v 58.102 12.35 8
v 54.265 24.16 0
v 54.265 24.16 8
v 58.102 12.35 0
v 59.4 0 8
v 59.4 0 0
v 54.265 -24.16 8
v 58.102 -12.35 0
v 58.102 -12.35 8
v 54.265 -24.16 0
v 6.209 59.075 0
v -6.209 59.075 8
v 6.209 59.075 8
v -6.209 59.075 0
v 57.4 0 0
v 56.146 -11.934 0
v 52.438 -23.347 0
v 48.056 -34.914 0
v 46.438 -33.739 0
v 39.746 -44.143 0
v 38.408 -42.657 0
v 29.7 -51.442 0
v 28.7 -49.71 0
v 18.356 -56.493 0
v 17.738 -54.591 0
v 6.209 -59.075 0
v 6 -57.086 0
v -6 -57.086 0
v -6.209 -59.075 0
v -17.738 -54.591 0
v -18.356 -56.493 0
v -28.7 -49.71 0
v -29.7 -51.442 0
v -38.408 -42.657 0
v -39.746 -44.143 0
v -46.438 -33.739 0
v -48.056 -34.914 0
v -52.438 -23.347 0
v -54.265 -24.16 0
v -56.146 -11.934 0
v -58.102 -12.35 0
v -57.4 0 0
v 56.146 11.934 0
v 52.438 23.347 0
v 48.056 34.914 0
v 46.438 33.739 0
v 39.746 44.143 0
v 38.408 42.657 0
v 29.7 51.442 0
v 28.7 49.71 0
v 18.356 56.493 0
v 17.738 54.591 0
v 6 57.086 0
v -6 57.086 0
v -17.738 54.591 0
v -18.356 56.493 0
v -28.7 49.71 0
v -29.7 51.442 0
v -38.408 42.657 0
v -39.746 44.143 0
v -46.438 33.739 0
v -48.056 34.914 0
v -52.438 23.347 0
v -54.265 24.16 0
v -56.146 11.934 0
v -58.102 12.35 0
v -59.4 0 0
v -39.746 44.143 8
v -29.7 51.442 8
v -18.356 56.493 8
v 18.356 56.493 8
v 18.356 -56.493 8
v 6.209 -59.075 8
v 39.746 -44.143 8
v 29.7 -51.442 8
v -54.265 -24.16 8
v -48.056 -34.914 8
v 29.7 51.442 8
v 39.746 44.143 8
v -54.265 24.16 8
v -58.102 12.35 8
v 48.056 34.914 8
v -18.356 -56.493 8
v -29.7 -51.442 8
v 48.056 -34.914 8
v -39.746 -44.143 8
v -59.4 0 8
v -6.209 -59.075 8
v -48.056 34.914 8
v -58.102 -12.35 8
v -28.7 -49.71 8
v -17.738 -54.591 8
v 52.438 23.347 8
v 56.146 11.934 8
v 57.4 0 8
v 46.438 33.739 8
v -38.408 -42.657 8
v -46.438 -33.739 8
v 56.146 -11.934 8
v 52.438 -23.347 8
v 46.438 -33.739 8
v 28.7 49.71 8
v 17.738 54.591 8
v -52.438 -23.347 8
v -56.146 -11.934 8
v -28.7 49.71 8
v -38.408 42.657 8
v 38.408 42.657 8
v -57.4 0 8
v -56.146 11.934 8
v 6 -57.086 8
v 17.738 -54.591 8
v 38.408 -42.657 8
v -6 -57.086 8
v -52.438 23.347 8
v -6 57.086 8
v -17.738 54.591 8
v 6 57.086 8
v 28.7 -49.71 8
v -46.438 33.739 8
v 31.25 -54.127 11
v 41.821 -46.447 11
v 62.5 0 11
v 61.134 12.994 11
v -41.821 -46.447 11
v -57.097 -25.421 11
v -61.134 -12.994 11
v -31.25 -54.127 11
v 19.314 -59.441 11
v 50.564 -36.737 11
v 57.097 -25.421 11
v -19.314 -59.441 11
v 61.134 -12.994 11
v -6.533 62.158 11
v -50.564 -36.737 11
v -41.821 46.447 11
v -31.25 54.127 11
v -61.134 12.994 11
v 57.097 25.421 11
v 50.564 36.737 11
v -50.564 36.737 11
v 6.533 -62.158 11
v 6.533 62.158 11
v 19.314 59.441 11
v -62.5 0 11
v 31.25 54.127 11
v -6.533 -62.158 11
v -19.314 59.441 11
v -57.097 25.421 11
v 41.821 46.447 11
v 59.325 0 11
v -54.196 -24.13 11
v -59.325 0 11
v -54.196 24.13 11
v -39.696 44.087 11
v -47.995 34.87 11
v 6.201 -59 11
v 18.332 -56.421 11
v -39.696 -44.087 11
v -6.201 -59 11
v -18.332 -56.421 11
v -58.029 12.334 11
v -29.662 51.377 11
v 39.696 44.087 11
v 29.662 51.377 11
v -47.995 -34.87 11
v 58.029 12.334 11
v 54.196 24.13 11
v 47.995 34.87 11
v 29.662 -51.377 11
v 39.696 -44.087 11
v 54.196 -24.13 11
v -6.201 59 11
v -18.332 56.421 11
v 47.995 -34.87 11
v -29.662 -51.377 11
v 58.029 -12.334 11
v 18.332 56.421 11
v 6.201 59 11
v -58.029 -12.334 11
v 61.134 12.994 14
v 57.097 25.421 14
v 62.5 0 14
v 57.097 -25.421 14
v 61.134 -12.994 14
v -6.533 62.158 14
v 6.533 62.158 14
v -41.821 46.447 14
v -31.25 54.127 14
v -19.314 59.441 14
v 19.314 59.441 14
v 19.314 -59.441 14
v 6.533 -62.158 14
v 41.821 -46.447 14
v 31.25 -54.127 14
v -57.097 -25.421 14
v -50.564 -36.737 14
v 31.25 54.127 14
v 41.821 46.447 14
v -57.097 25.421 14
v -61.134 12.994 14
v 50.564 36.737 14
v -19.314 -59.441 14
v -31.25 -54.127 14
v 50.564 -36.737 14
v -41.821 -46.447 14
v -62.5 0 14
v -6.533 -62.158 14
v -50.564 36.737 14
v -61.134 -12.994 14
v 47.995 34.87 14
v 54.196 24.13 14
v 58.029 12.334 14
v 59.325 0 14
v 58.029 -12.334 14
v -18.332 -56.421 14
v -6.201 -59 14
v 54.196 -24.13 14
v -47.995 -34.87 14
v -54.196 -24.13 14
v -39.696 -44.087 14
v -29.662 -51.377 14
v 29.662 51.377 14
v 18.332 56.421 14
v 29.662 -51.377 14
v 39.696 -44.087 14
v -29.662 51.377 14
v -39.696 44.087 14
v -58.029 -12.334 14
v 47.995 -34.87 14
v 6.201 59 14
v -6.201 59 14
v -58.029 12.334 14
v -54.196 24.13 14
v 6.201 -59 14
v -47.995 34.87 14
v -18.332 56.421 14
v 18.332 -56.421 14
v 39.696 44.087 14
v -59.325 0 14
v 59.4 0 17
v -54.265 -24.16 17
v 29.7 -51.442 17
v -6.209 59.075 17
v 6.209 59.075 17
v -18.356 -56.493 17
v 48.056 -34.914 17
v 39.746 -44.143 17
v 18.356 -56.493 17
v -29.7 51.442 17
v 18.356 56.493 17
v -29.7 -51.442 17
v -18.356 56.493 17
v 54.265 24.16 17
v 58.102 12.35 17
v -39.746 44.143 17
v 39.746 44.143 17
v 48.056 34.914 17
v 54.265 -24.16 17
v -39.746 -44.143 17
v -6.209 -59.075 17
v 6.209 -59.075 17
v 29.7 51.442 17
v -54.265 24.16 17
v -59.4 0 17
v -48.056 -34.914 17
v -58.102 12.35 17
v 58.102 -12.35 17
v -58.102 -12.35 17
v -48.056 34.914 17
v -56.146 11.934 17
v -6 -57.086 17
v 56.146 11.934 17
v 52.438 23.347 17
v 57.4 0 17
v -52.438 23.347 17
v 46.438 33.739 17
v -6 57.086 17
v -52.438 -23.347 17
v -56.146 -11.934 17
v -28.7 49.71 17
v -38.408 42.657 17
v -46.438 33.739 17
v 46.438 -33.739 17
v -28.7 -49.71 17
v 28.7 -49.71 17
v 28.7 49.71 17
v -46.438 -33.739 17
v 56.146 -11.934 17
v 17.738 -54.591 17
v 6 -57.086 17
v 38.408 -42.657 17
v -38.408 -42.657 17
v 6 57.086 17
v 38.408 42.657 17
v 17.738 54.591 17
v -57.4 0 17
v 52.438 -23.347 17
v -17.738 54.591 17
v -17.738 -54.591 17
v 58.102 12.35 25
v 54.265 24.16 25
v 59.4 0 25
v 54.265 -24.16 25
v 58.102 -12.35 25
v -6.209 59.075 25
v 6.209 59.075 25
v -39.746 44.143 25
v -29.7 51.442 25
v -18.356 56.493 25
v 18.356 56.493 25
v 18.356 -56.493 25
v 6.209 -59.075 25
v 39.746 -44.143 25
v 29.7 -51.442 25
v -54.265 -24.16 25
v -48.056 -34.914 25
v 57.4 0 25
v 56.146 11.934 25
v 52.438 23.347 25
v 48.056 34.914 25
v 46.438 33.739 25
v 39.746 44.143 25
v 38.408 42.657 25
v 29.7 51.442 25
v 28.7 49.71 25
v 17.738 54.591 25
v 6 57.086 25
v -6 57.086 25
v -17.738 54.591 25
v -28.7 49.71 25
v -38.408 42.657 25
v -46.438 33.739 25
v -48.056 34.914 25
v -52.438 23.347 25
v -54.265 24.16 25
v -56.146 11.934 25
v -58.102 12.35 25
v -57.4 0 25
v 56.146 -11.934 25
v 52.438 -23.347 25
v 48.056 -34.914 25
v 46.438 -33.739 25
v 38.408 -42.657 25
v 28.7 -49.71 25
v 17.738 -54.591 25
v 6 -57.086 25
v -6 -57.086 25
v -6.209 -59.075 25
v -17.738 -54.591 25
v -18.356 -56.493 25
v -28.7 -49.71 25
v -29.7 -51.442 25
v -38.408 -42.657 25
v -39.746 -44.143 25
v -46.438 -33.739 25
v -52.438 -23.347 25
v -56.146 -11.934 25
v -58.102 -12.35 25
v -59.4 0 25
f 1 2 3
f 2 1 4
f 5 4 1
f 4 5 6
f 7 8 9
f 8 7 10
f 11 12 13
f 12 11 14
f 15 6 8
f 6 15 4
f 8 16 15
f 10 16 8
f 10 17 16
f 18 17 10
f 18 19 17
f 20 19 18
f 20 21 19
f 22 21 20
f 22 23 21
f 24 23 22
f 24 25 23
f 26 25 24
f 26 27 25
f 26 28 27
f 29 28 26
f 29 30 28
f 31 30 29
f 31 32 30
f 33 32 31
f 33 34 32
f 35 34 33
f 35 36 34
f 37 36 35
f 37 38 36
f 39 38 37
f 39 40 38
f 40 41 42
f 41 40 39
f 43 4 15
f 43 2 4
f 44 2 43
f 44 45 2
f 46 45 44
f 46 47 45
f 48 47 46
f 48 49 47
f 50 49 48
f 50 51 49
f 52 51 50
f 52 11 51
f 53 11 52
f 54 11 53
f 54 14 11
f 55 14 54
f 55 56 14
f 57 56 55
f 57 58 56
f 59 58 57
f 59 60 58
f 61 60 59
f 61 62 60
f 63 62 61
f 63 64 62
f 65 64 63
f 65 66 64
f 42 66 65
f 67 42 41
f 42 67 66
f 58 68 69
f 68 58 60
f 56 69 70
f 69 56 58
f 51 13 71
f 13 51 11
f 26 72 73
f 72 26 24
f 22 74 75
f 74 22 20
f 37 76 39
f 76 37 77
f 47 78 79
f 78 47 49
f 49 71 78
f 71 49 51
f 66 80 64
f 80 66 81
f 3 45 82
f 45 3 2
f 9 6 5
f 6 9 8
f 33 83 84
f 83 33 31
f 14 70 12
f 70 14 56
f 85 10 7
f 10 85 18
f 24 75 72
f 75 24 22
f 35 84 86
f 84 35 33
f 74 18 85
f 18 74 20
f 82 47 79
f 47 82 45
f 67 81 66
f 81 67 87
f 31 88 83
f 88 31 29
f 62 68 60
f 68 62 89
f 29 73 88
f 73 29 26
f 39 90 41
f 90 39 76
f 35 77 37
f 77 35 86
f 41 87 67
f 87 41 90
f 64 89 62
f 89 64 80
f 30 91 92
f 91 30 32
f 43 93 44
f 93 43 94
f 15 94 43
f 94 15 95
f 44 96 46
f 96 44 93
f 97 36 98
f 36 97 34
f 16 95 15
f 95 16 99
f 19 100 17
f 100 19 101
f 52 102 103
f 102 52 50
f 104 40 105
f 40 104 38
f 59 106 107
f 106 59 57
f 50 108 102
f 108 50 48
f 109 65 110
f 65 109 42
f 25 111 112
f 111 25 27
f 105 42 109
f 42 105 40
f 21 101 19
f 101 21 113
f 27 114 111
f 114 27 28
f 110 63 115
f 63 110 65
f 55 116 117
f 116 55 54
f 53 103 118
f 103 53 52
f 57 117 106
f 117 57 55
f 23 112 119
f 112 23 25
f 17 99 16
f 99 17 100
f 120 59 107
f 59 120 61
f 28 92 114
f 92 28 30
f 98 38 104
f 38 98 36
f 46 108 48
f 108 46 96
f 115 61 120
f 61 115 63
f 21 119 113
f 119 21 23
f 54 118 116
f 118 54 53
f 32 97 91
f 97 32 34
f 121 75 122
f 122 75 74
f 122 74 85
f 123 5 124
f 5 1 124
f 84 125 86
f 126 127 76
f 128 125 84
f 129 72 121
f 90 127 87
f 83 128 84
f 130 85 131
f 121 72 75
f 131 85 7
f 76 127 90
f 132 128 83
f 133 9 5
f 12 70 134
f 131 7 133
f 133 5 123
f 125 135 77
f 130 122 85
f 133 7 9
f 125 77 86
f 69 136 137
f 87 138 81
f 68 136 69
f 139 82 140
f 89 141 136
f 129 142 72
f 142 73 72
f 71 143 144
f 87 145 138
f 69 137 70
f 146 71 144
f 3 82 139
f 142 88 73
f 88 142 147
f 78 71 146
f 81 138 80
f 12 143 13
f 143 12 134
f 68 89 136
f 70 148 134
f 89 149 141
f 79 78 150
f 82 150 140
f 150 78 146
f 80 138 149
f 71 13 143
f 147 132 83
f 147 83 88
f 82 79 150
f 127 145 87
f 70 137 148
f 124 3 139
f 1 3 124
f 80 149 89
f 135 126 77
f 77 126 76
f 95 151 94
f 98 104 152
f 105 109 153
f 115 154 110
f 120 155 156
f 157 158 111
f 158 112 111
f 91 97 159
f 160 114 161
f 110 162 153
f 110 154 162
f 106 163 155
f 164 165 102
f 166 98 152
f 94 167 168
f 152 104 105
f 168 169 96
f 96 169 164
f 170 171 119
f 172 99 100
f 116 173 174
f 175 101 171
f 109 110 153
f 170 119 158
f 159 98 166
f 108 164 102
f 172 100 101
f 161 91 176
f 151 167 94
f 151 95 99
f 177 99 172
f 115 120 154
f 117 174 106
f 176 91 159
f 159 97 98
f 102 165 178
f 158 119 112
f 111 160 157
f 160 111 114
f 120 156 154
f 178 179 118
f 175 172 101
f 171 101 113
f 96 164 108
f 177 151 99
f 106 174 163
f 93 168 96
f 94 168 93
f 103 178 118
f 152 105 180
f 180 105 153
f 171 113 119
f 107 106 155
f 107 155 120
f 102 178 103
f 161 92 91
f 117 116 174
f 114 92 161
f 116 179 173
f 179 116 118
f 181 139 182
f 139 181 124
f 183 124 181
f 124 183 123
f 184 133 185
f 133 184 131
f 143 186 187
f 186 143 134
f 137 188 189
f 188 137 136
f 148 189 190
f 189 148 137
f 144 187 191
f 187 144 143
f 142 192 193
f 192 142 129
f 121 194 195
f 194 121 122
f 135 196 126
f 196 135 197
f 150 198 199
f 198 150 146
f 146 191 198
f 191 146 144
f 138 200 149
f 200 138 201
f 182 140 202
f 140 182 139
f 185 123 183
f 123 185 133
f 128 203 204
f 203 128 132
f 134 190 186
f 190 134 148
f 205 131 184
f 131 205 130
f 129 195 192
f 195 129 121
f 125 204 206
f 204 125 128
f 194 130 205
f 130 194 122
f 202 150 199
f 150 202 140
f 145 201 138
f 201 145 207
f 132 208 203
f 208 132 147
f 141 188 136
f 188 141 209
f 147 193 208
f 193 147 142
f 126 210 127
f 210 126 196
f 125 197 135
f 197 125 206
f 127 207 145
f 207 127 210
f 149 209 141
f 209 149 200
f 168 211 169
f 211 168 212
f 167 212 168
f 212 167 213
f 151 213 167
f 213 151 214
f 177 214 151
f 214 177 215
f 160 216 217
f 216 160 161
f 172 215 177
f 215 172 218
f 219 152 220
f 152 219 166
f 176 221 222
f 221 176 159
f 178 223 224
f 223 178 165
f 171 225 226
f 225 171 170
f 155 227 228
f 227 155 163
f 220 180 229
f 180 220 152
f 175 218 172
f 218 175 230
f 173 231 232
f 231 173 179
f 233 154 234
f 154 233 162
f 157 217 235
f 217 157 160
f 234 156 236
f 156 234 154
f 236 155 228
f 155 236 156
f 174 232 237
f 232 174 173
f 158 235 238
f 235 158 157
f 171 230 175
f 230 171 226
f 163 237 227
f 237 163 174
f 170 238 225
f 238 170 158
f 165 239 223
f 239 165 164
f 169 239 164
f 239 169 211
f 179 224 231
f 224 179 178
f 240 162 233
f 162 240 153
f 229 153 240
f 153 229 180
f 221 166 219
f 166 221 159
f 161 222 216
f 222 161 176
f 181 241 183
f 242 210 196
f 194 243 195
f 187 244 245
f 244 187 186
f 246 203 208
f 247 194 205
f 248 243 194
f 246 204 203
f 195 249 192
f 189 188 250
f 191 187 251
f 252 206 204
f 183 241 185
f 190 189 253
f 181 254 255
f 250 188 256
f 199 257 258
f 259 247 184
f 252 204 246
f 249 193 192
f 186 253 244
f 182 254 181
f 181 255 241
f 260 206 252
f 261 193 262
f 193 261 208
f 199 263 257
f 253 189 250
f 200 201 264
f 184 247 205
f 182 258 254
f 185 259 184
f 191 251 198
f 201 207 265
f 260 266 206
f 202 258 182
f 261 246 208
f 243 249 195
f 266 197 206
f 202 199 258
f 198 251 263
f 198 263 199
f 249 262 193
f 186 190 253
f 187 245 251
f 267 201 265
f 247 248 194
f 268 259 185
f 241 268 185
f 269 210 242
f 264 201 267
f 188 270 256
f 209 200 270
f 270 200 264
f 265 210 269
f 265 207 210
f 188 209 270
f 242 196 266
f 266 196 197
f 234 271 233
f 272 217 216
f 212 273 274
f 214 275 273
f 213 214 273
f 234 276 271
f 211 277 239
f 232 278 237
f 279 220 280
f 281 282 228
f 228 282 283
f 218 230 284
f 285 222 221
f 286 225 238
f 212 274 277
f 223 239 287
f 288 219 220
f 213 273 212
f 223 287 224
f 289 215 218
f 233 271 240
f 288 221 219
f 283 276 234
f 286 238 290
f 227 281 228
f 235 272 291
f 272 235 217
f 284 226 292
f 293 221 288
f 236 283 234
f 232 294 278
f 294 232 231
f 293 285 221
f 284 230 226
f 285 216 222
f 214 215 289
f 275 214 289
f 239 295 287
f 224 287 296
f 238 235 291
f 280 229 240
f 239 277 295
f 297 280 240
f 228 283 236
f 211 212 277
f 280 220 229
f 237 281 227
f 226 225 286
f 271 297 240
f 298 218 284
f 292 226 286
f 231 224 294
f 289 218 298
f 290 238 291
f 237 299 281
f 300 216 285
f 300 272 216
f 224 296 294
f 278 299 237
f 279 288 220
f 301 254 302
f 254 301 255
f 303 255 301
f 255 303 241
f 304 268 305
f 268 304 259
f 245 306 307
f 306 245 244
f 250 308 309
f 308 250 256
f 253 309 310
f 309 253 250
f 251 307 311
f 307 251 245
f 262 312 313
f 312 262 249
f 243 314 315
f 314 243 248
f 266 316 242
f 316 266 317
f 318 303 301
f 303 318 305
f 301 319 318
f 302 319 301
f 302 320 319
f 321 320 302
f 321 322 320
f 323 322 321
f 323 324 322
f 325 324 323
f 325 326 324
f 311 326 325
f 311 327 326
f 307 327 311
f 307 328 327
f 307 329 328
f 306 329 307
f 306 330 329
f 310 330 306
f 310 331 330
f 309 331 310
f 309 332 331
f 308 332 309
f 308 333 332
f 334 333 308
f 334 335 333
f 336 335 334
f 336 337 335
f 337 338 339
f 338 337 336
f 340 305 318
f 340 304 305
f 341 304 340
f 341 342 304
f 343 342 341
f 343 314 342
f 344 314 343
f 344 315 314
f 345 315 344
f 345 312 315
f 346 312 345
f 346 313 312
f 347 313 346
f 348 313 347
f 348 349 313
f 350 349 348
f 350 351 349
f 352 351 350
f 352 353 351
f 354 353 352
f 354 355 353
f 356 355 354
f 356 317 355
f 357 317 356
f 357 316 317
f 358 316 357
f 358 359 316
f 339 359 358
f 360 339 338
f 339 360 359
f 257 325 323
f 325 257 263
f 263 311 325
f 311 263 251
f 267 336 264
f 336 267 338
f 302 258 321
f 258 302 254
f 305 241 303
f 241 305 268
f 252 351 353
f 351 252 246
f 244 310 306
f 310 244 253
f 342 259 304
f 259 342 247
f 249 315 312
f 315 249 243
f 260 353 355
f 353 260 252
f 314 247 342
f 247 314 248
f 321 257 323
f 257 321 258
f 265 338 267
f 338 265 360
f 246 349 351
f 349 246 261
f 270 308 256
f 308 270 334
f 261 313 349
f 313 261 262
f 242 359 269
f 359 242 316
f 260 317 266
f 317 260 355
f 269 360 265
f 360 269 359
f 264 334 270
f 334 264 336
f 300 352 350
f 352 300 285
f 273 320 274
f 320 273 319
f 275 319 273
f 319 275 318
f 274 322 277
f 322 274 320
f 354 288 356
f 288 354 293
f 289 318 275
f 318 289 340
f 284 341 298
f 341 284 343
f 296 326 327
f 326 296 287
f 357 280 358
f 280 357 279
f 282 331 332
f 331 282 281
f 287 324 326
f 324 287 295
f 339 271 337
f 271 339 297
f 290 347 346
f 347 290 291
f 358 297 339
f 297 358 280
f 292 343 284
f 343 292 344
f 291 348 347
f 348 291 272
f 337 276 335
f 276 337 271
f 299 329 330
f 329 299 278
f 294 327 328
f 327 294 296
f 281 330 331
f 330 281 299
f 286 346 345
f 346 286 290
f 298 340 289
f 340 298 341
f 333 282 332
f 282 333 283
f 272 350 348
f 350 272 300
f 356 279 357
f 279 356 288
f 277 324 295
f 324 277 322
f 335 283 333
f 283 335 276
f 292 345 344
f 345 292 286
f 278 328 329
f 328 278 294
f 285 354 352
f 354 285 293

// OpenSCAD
/*
French Weather Station 125mm Pipe Join Fix
Remixed for https://www.thingiverse.com/thing:5990046

Saving filament and time by coupling old print to newer print

Created March 26, 2024
Modified March 26, 2024
*/

skinny_od = 118.2 + 0.6; // same as funnel fitting OD, just tighter fit
skinny_id = skinny_od - 4; // can be thin here
wide_od = 125;
wide_id = 118.2 + 0.45; // should fit outside funnel fitting OD

wide_h = 3;
taper_h = 3;
skinny_h = 8;

$fs = 0.2;

module pipe_fix() {
    // skinny end
    translate([0, 0, 0])
    difference() {
        cylinder(d=skinny_od, h=skinny_h);
        cylinder(d=skinny_id, h=skinny_h);
    }

    // taper
    translate([0, 0, skinny_h])
    difference() {
        cylinder(d1=skinny_od, d2=wide_od, h=taper_h);
        cylinder(d1=skinny_id, d2=wide_id, h=taper_h);
    }

    // wide end
    translate([0, 0, skinny_h + taper_h])
    difference() {
        cylinder(d=wide_od, h=wide_h);
        cylinder(d=wide_id, h=wide_h);
    }

    // taper
    translate([0, 0, skinny_h + taper_h + wide_h])
    difference() {
        cylinder(d1=wide_od, d2=skinny_od, h=taper_h);
        cylinder(d1=wide_id, d2=skinny_id, h=taper_h);
    }

    // skinny end
    translate([0, 0, skinny_h + taper_h + wide_h + taper_h])
    difference() {
        cylinder(d=skinny_od, h=skinny_h);
        cylinder(d=skinny_id, h=skinny_h);
    }
}

test_h = 2;
module wide_test_ring() {
    // wide
    difference() {
        cylinder(d=wide_od, h=test_h);
        cylinder(d=wide_id, h=test_h);
    }
}

module skinny_test_ring() {
    // skinny
    difference() {
        cylinder(d=skinny_od, h=test_h * 2);
        cylinder(d=skinny_id, h=test_h * 2);
    }
}

// wide_test_ring();
// skinny_test_ring();

pipe_fix();
